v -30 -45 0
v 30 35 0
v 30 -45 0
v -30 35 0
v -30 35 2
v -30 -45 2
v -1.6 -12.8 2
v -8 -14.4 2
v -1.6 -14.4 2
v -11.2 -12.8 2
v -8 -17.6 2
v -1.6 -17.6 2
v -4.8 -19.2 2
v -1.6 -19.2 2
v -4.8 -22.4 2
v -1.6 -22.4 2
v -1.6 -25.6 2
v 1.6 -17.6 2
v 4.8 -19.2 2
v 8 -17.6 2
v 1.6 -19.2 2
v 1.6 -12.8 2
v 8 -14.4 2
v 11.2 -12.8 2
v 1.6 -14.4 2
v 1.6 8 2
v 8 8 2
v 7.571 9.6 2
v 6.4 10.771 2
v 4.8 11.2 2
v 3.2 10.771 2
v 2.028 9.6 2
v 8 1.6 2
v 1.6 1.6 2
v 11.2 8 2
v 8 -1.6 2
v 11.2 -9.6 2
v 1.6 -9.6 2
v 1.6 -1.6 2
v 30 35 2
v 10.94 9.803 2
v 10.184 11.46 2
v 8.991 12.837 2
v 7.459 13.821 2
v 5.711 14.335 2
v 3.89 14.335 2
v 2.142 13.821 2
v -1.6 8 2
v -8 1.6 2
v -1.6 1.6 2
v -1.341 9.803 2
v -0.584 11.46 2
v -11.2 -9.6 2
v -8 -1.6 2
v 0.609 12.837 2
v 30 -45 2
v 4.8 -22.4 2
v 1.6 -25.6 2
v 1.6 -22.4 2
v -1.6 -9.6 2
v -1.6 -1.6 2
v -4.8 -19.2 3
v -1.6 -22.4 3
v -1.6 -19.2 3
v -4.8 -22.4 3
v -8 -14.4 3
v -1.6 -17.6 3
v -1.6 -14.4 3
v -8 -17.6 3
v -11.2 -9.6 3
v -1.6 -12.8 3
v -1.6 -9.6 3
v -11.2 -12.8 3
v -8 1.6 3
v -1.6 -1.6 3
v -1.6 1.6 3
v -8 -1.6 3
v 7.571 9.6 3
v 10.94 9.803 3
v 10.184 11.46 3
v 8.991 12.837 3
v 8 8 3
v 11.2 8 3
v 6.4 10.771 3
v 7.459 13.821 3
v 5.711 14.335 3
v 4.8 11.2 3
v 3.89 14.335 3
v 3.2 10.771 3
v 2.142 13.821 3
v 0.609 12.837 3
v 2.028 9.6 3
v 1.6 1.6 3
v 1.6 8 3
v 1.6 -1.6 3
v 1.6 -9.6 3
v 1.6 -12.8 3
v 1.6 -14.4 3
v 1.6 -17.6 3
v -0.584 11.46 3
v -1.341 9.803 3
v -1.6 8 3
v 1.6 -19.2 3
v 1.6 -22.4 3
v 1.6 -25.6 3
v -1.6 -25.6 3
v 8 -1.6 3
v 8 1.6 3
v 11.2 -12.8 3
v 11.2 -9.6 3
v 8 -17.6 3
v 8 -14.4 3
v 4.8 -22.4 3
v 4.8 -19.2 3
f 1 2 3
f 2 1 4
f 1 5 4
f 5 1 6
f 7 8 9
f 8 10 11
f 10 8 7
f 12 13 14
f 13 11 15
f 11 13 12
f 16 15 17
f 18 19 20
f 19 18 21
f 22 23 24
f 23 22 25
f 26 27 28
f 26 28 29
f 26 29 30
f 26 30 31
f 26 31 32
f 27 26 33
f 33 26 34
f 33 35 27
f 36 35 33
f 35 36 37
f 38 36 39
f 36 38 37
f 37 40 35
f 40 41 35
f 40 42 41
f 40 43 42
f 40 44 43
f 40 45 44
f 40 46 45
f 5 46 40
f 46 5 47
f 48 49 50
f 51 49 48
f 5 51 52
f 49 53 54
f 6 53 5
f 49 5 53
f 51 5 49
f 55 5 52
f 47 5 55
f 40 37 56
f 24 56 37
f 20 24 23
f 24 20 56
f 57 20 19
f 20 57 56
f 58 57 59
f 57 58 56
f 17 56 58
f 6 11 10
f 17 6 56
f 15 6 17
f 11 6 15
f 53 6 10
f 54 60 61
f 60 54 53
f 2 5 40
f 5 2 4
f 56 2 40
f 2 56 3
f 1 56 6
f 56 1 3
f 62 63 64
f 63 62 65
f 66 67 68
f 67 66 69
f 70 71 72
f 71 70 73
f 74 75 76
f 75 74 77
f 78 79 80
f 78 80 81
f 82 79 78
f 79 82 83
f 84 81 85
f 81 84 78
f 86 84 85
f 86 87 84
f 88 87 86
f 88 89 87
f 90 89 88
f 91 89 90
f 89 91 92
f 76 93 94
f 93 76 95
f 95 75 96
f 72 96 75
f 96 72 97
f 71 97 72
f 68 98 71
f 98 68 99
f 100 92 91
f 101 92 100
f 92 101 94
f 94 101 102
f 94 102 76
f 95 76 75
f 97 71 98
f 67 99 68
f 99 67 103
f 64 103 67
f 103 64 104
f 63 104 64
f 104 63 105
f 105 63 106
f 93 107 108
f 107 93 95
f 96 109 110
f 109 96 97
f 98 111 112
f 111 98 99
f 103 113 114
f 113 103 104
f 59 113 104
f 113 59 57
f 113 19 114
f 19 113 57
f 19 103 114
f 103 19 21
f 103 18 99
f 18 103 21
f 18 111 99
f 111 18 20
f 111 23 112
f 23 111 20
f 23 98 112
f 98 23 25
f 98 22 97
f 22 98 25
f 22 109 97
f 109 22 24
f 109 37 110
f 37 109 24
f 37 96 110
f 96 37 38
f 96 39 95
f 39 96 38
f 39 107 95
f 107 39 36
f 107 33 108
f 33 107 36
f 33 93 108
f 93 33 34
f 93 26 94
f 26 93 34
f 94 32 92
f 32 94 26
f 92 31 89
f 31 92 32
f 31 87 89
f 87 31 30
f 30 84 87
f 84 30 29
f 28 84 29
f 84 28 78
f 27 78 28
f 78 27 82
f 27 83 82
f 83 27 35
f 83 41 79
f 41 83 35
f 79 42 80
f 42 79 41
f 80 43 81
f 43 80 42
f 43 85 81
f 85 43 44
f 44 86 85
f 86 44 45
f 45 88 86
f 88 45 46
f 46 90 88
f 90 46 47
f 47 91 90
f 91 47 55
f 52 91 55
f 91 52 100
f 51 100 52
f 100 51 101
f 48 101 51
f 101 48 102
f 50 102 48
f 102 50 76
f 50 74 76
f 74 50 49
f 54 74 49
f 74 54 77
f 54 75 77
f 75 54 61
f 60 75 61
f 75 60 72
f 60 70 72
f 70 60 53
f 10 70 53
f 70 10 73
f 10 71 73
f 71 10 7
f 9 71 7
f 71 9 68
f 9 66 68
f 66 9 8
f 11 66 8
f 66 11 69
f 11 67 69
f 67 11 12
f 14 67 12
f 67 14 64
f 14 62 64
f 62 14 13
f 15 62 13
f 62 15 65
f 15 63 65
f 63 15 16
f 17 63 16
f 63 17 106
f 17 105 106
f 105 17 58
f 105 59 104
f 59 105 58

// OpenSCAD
union() {
translate([-30,-45,0]) linear_extrude(height=2) square([60,80]);
translate([0,0,2]) linear_extrude(file="FoulabF.dxf",height=1);
}
